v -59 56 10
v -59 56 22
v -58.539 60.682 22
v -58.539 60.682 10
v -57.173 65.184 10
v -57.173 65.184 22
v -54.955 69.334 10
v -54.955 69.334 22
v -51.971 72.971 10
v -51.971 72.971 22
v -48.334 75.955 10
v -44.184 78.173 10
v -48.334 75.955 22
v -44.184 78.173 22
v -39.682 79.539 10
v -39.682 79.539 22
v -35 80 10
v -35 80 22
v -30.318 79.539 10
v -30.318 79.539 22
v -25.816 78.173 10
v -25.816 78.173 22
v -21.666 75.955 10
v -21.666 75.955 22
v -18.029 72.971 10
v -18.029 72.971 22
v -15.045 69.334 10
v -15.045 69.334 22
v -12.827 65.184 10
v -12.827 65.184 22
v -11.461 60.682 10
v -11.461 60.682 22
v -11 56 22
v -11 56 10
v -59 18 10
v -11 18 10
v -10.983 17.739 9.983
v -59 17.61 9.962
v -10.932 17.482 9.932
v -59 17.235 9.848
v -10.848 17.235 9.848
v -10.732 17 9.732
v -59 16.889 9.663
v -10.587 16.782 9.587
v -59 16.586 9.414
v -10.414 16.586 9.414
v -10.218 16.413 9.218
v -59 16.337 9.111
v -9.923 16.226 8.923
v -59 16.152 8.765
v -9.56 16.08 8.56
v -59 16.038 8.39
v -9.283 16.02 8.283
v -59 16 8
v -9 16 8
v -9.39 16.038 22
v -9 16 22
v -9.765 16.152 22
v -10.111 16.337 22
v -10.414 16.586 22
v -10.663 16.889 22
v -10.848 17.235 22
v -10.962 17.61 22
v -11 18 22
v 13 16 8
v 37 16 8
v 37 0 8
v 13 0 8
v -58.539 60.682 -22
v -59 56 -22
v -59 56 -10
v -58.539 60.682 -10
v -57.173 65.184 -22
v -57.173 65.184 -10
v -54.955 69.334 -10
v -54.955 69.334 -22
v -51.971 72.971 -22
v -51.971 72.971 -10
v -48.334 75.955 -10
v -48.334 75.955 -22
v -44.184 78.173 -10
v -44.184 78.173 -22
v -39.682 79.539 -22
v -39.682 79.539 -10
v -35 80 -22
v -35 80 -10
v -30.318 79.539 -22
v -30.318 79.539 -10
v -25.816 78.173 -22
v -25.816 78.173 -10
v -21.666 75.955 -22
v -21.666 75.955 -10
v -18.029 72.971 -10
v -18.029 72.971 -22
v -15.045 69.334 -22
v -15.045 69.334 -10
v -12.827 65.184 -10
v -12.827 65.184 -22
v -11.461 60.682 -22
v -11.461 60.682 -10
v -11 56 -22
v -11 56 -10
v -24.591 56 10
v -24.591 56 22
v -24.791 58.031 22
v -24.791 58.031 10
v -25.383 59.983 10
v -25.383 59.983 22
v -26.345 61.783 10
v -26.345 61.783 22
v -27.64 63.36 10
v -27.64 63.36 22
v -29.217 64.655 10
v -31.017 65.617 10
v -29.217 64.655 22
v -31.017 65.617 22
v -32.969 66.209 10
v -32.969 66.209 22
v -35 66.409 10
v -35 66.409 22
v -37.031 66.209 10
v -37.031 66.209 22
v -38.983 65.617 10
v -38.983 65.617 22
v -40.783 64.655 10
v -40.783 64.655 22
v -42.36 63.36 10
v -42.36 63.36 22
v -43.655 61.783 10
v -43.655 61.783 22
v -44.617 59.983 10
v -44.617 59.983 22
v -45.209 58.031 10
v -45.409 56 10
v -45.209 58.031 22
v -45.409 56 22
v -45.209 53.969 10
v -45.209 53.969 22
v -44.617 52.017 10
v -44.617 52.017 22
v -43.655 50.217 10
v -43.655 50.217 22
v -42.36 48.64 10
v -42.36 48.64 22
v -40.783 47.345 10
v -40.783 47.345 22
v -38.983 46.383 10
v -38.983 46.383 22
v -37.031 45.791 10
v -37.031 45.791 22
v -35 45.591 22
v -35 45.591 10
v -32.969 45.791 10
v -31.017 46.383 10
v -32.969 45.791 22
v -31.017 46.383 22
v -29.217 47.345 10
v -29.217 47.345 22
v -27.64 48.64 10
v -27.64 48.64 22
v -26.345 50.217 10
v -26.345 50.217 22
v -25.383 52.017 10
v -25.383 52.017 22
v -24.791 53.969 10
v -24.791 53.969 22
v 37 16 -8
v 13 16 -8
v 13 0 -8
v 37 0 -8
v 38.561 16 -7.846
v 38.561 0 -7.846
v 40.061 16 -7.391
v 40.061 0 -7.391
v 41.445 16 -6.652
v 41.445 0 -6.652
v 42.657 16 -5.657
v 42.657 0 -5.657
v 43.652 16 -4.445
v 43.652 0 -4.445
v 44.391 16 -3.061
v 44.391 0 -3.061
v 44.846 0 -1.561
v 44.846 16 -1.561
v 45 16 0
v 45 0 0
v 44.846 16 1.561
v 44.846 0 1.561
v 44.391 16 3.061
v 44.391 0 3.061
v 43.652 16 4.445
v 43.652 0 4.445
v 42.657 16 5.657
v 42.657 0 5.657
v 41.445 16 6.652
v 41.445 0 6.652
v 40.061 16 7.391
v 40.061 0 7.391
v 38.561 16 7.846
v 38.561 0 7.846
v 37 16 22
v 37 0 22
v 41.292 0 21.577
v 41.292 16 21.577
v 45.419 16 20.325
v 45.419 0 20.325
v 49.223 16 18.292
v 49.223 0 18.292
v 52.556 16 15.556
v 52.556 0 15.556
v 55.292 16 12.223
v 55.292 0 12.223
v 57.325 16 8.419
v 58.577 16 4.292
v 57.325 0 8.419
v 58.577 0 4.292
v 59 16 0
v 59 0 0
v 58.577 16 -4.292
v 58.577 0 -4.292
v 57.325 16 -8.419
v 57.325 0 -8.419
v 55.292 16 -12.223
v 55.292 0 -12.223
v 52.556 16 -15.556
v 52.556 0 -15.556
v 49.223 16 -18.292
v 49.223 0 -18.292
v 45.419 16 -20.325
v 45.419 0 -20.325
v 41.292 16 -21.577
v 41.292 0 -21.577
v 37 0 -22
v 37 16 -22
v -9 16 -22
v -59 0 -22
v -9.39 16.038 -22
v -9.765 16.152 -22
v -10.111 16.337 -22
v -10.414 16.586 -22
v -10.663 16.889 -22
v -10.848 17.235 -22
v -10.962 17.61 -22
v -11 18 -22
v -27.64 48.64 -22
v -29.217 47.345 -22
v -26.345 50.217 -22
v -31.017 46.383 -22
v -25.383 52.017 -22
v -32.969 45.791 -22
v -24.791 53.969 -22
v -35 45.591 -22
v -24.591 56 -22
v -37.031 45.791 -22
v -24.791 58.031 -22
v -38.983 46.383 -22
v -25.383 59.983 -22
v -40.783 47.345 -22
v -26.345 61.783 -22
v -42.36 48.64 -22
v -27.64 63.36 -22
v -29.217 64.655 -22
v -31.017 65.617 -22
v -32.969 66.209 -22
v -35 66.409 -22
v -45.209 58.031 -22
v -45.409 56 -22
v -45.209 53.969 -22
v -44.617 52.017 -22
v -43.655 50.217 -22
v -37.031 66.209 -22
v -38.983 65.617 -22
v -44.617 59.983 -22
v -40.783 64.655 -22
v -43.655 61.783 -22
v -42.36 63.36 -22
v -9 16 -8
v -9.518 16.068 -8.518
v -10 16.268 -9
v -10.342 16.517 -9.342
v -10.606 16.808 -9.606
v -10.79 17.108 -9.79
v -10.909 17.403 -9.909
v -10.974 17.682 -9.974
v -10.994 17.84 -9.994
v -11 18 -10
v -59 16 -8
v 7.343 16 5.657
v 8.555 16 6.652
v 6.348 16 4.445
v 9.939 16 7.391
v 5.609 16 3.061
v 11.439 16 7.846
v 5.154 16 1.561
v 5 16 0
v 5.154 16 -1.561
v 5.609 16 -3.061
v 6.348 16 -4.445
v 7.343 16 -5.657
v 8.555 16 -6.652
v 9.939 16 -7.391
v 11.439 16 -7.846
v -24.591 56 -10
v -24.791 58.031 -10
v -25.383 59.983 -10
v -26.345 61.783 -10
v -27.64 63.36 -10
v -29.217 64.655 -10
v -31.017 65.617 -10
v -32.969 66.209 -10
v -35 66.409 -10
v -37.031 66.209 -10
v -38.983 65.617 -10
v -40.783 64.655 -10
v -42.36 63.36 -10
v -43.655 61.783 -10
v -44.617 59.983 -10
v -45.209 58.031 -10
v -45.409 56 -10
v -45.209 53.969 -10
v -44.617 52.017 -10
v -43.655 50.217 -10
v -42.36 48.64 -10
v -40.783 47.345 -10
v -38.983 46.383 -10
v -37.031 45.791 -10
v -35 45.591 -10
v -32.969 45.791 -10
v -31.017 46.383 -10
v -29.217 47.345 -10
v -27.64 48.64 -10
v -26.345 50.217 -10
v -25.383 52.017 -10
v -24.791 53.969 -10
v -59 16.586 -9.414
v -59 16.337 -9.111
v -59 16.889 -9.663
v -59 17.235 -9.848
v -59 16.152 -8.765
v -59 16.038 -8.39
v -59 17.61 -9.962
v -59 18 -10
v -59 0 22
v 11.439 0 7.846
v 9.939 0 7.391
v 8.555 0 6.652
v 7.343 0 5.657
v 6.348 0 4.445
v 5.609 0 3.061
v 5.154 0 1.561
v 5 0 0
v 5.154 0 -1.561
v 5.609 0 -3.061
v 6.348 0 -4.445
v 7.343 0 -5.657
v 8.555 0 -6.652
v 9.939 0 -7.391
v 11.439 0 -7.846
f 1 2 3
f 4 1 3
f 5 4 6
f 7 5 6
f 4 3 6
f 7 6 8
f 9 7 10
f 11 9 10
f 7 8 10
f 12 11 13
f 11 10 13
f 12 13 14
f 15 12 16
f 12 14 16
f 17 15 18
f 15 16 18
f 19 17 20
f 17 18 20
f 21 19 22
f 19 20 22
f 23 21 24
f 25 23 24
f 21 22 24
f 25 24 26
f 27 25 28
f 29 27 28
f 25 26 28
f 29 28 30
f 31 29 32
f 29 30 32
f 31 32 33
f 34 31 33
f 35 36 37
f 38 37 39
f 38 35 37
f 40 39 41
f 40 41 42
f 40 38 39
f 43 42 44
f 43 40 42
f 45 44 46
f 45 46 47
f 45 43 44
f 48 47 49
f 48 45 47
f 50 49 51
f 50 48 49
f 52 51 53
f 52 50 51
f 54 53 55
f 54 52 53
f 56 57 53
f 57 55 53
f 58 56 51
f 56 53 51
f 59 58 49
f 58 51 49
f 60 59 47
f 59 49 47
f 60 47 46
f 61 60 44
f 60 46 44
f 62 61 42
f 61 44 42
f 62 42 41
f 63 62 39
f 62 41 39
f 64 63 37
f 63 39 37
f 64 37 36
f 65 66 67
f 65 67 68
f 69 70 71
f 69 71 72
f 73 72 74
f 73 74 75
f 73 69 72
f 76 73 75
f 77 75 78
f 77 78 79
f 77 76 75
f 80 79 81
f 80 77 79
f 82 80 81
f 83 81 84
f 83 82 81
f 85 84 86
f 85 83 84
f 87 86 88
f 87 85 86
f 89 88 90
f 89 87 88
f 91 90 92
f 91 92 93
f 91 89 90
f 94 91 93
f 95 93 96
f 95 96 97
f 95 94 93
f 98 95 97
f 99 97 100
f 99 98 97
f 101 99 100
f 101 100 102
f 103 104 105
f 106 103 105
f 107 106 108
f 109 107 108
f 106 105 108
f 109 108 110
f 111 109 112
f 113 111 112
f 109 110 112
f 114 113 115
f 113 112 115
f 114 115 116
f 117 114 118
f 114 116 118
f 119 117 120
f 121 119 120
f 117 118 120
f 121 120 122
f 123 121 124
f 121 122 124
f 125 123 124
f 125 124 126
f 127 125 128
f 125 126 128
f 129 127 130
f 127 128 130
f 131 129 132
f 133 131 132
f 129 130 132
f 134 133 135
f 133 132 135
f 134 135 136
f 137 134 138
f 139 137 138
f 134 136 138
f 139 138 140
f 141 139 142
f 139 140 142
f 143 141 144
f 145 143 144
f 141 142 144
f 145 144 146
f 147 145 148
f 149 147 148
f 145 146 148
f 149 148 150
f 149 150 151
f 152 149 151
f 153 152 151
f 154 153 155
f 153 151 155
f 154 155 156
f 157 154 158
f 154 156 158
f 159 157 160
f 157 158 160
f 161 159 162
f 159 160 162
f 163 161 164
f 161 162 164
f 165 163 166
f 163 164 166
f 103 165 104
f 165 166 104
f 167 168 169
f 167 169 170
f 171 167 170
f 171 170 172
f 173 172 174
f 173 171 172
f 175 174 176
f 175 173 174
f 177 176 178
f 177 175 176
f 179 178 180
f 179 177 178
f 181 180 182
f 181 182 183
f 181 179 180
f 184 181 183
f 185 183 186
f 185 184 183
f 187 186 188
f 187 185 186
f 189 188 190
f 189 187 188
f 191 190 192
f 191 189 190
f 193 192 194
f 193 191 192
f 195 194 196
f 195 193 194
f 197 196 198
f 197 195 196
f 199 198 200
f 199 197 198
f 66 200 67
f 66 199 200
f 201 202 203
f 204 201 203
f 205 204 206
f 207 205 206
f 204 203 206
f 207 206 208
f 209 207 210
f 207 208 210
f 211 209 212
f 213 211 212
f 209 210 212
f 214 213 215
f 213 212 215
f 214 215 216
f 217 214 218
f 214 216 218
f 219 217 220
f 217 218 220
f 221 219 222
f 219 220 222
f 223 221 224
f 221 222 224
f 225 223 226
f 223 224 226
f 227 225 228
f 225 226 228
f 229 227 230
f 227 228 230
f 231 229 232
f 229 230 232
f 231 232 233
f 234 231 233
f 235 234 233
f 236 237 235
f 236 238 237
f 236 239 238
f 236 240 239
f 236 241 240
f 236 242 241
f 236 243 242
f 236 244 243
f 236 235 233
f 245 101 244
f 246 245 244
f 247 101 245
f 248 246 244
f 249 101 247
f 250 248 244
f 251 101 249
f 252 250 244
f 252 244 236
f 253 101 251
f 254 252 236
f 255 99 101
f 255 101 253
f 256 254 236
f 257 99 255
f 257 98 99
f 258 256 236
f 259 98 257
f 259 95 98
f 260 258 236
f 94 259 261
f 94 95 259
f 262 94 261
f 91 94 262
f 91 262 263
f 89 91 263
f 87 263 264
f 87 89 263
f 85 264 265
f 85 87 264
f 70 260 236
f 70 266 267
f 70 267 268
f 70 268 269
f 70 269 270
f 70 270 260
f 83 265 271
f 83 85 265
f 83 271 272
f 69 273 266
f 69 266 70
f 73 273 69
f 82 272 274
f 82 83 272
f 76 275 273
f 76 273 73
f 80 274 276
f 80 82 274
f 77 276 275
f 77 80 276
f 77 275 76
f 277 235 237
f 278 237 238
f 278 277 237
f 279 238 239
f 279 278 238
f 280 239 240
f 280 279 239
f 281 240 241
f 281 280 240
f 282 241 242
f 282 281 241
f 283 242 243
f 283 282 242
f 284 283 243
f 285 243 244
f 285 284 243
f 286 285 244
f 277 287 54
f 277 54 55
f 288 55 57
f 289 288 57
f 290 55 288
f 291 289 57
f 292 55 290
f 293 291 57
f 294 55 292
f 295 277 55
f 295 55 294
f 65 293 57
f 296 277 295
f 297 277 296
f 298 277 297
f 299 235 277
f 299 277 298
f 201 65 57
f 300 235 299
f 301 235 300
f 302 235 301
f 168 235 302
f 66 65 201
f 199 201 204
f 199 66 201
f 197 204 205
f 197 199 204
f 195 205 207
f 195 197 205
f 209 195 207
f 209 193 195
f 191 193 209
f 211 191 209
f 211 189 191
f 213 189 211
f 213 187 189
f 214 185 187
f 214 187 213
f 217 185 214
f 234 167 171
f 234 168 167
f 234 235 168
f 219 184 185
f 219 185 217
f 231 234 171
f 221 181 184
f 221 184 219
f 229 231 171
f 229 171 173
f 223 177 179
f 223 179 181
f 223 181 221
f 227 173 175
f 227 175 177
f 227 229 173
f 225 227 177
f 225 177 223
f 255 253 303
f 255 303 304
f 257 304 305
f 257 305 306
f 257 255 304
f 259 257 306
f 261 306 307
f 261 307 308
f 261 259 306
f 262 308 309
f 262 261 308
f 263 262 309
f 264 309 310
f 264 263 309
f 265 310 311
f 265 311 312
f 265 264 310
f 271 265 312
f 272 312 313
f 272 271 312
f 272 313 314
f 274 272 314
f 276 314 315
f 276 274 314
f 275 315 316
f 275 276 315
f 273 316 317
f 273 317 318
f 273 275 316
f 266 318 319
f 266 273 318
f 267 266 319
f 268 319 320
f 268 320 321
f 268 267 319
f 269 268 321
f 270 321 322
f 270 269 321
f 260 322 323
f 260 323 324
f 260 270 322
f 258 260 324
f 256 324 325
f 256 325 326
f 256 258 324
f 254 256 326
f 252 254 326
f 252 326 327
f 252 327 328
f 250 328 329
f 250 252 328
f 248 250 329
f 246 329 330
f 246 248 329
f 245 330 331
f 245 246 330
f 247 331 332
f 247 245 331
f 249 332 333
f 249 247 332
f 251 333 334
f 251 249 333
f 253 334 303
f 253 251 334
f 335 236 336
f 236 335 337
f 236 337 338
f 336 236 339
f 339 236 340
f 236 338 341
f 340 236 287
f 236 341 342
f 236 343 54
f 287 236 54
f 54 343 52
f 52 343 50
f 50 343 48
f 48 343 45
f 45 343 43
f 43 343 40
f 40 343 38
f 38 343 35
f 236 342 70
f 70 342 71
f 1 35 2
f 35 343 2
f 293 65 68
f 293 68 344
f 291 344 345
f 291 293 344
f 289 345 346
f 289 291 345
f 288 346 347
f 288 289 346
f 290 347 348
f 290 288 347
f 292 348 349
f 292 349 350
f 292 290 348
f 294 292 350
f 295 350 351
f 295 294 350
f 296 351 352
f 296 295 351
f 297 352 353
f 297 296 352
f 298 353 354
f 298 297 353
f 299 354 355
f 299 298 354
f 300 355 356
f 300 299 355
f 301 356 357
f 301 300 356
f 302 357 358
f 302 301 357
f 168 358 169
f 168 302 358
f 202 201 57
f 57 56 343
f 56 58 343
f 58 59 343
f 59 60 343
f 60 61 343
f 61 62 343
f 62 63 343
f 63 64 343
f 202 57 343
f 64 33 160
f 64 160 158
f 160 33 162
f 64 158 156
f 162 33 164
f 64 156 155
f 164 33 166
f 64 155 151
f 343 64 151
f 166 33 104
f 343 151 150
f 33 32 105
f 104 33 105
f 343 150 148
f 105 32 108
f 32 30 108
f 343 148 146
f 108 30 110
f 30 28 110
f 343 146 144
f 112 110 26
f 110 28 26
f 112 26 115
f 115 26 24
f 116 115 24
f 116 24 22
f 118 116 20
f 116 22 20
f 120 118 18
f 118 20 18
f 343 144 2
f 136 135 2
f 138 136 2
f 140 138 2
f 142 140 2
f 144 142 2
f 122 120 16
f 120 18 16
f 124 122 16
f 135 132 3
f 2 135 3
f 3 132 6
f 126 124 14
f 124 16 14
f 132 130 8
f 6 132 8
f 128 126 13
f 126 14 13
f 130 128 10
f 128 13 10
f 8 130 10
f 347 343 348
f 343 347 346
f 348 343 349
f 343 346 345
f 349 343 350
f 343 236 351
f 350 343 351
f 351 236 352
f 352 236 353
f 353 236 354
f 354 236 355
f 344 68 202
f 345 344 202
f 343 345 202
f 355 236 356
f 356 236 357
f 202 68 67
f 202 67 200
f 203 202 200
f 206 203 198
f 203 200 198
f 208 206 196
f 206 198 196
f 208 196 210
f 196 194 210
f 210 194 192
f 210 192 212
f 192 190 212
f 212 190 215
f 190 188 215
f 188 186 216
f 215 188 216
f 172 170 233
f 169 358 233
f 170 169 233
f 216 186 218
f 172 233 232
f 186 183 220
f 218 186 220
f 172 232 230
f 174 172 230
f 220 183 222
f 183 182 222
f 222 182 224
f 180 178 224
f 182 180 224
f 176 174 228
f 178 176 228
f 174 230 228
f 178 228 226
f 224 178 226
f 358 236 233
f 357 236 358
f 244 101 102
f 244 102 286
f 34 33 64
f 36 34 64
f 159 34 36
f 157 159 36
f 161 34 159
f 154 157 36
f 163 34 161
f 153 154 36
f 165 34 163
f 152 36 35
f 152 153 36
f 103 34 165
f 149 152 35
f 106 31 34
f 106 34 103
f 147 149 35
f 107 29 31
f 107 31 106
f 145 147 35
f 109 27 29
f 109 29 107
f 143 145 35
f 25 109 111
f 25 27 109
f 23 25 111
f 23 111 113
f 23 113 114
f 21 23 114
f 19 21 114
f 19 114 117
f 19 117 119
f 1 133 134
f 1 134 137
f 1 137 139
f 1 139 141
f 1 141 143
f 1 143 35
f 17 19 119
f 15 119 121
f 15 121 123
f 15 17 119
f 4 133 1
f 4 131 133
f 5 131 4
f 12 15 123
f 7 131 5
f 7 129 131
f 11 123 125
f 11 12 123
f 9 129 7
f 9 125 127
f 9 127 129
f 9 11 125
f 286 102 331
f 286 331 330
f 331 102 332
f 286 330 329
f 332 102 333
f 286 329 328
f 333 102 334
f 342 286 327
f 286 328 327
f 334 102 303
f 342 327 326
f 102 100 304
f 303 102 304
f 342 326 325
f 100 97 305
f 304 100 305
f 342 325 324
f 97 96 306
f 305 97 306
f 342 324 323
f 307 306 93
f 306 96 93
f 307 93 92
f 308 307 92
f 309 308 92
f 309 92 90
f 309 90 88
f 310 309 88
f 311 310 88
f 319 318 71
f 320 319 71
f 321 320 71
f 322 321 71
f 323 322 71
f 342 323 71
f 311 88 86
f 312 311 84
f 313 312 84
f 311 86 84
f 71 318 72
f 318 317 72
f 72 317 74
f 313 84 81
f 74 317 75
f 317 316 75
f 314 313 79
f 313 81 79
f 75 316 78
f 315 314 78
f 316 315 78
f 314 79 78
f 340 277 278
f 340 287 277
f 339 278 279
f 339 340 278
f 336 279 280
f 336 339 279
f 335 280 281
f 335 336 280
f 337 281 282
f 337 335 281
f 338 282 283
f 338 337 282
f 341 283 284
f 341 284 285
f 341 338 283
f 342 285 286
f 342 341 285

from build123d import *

# Parameters (mm, degrees)
BOSS_EXTRUDE1_DEPTH = 16
CUT_EXTRUDE2_DEPTH  = 16
BOSS_EXTRUDE2_DEPTH = 12
FILLET3_R           = 2


with BuildPart() as part:
    # Sketch4 → Boss-Extrude1 (new body)
    with BuildSketch(Plane(origin=(0, 0, 0), x_dir=(1, 0, 0), z_dir=(0, 1, 0))):
        with BuildLine():
            Line((-59, -22), (37, -22))
            ThreePointArc((37, -22), (59, 0), (37, 22))
            Line((37, 22), (-59, 22))
            Line((-59, 22), (-59, -22))
        make_face()
    extrude(amount=BOSS_EXTRUDE1_DEPTH)

    # Sketch6 → Cut-Extrude2 (cut)
    with BuildSketch(Plane(origin=(0, 16, 0), x_dir=(1, 0, 0), z_dir=(0, 1, 0))):
        with BuildLine():
            Line((37, -8), (13, -8))
            ThreePointArc((13, -8), (5, 0), (13, 8))
            Line((13, 8), (37, 8))
            ThreePointArc((37, 8), (45, 0), (37, -8))
        make_face()
    extrude(amount=-CUT_EXTRUDE2_DEPTH, mode=Mode.SUBTRACT)

    # Sketch9 → Boss-Extrude2 (add)
    with BuildSketch(Plane(origin=(0, 0, -22), x_dir=(-1, 0, 0), z_dir=(0, 0, -1))):
        with BuildLine():
            Line((11, 16), (59, 16))
            Line((59, 16), (59, 56))
            ThreePointArc((59, 56), (35, 32), (11, 56))
            Line((11, 56), (11, 16))
        make_face()
        with BuildLine():
            ThreePointArc((11, 56), (35, 32), (59, 56))
            Line((59, 56), (45.408831702, 56))
            ThreePointArc((45.408831702, 56), (35, 45.591168298), (24.591168298, 56))
            Line((24.591168298, 56), (11, 56))
        make_face()
        with BuildLine():
            Line((45.408831702, 56), (59, 56))
            ThreePointArc((59, 56), (35, 80), (11, 56))
            Line((11, 56), (24.591168298, 56))
            ThreePointArc((24.591168298, 56), (35, 66.408831702), (45.408831702, 56))
        make_face()
    boss_extrude2 = extrude(amount=-BOSS_EXTRUDE2_DEPTH)

    # Mirror5: Boss-Extrude2 across plane
    add(boss_extrude2.mirror(Plane.XY))

    # Fillet3
    fillet3_edges = [part.edges().sort_by_distance(p)[0] for p in [
        (-11, 16, -16),
        (-35, 16, -10),
        (-35, 16, 10),
        (-11, 16, 16),
    ]]
    fillet(fillet3_edges, radius=FILLET3_R)


solid = part.part
